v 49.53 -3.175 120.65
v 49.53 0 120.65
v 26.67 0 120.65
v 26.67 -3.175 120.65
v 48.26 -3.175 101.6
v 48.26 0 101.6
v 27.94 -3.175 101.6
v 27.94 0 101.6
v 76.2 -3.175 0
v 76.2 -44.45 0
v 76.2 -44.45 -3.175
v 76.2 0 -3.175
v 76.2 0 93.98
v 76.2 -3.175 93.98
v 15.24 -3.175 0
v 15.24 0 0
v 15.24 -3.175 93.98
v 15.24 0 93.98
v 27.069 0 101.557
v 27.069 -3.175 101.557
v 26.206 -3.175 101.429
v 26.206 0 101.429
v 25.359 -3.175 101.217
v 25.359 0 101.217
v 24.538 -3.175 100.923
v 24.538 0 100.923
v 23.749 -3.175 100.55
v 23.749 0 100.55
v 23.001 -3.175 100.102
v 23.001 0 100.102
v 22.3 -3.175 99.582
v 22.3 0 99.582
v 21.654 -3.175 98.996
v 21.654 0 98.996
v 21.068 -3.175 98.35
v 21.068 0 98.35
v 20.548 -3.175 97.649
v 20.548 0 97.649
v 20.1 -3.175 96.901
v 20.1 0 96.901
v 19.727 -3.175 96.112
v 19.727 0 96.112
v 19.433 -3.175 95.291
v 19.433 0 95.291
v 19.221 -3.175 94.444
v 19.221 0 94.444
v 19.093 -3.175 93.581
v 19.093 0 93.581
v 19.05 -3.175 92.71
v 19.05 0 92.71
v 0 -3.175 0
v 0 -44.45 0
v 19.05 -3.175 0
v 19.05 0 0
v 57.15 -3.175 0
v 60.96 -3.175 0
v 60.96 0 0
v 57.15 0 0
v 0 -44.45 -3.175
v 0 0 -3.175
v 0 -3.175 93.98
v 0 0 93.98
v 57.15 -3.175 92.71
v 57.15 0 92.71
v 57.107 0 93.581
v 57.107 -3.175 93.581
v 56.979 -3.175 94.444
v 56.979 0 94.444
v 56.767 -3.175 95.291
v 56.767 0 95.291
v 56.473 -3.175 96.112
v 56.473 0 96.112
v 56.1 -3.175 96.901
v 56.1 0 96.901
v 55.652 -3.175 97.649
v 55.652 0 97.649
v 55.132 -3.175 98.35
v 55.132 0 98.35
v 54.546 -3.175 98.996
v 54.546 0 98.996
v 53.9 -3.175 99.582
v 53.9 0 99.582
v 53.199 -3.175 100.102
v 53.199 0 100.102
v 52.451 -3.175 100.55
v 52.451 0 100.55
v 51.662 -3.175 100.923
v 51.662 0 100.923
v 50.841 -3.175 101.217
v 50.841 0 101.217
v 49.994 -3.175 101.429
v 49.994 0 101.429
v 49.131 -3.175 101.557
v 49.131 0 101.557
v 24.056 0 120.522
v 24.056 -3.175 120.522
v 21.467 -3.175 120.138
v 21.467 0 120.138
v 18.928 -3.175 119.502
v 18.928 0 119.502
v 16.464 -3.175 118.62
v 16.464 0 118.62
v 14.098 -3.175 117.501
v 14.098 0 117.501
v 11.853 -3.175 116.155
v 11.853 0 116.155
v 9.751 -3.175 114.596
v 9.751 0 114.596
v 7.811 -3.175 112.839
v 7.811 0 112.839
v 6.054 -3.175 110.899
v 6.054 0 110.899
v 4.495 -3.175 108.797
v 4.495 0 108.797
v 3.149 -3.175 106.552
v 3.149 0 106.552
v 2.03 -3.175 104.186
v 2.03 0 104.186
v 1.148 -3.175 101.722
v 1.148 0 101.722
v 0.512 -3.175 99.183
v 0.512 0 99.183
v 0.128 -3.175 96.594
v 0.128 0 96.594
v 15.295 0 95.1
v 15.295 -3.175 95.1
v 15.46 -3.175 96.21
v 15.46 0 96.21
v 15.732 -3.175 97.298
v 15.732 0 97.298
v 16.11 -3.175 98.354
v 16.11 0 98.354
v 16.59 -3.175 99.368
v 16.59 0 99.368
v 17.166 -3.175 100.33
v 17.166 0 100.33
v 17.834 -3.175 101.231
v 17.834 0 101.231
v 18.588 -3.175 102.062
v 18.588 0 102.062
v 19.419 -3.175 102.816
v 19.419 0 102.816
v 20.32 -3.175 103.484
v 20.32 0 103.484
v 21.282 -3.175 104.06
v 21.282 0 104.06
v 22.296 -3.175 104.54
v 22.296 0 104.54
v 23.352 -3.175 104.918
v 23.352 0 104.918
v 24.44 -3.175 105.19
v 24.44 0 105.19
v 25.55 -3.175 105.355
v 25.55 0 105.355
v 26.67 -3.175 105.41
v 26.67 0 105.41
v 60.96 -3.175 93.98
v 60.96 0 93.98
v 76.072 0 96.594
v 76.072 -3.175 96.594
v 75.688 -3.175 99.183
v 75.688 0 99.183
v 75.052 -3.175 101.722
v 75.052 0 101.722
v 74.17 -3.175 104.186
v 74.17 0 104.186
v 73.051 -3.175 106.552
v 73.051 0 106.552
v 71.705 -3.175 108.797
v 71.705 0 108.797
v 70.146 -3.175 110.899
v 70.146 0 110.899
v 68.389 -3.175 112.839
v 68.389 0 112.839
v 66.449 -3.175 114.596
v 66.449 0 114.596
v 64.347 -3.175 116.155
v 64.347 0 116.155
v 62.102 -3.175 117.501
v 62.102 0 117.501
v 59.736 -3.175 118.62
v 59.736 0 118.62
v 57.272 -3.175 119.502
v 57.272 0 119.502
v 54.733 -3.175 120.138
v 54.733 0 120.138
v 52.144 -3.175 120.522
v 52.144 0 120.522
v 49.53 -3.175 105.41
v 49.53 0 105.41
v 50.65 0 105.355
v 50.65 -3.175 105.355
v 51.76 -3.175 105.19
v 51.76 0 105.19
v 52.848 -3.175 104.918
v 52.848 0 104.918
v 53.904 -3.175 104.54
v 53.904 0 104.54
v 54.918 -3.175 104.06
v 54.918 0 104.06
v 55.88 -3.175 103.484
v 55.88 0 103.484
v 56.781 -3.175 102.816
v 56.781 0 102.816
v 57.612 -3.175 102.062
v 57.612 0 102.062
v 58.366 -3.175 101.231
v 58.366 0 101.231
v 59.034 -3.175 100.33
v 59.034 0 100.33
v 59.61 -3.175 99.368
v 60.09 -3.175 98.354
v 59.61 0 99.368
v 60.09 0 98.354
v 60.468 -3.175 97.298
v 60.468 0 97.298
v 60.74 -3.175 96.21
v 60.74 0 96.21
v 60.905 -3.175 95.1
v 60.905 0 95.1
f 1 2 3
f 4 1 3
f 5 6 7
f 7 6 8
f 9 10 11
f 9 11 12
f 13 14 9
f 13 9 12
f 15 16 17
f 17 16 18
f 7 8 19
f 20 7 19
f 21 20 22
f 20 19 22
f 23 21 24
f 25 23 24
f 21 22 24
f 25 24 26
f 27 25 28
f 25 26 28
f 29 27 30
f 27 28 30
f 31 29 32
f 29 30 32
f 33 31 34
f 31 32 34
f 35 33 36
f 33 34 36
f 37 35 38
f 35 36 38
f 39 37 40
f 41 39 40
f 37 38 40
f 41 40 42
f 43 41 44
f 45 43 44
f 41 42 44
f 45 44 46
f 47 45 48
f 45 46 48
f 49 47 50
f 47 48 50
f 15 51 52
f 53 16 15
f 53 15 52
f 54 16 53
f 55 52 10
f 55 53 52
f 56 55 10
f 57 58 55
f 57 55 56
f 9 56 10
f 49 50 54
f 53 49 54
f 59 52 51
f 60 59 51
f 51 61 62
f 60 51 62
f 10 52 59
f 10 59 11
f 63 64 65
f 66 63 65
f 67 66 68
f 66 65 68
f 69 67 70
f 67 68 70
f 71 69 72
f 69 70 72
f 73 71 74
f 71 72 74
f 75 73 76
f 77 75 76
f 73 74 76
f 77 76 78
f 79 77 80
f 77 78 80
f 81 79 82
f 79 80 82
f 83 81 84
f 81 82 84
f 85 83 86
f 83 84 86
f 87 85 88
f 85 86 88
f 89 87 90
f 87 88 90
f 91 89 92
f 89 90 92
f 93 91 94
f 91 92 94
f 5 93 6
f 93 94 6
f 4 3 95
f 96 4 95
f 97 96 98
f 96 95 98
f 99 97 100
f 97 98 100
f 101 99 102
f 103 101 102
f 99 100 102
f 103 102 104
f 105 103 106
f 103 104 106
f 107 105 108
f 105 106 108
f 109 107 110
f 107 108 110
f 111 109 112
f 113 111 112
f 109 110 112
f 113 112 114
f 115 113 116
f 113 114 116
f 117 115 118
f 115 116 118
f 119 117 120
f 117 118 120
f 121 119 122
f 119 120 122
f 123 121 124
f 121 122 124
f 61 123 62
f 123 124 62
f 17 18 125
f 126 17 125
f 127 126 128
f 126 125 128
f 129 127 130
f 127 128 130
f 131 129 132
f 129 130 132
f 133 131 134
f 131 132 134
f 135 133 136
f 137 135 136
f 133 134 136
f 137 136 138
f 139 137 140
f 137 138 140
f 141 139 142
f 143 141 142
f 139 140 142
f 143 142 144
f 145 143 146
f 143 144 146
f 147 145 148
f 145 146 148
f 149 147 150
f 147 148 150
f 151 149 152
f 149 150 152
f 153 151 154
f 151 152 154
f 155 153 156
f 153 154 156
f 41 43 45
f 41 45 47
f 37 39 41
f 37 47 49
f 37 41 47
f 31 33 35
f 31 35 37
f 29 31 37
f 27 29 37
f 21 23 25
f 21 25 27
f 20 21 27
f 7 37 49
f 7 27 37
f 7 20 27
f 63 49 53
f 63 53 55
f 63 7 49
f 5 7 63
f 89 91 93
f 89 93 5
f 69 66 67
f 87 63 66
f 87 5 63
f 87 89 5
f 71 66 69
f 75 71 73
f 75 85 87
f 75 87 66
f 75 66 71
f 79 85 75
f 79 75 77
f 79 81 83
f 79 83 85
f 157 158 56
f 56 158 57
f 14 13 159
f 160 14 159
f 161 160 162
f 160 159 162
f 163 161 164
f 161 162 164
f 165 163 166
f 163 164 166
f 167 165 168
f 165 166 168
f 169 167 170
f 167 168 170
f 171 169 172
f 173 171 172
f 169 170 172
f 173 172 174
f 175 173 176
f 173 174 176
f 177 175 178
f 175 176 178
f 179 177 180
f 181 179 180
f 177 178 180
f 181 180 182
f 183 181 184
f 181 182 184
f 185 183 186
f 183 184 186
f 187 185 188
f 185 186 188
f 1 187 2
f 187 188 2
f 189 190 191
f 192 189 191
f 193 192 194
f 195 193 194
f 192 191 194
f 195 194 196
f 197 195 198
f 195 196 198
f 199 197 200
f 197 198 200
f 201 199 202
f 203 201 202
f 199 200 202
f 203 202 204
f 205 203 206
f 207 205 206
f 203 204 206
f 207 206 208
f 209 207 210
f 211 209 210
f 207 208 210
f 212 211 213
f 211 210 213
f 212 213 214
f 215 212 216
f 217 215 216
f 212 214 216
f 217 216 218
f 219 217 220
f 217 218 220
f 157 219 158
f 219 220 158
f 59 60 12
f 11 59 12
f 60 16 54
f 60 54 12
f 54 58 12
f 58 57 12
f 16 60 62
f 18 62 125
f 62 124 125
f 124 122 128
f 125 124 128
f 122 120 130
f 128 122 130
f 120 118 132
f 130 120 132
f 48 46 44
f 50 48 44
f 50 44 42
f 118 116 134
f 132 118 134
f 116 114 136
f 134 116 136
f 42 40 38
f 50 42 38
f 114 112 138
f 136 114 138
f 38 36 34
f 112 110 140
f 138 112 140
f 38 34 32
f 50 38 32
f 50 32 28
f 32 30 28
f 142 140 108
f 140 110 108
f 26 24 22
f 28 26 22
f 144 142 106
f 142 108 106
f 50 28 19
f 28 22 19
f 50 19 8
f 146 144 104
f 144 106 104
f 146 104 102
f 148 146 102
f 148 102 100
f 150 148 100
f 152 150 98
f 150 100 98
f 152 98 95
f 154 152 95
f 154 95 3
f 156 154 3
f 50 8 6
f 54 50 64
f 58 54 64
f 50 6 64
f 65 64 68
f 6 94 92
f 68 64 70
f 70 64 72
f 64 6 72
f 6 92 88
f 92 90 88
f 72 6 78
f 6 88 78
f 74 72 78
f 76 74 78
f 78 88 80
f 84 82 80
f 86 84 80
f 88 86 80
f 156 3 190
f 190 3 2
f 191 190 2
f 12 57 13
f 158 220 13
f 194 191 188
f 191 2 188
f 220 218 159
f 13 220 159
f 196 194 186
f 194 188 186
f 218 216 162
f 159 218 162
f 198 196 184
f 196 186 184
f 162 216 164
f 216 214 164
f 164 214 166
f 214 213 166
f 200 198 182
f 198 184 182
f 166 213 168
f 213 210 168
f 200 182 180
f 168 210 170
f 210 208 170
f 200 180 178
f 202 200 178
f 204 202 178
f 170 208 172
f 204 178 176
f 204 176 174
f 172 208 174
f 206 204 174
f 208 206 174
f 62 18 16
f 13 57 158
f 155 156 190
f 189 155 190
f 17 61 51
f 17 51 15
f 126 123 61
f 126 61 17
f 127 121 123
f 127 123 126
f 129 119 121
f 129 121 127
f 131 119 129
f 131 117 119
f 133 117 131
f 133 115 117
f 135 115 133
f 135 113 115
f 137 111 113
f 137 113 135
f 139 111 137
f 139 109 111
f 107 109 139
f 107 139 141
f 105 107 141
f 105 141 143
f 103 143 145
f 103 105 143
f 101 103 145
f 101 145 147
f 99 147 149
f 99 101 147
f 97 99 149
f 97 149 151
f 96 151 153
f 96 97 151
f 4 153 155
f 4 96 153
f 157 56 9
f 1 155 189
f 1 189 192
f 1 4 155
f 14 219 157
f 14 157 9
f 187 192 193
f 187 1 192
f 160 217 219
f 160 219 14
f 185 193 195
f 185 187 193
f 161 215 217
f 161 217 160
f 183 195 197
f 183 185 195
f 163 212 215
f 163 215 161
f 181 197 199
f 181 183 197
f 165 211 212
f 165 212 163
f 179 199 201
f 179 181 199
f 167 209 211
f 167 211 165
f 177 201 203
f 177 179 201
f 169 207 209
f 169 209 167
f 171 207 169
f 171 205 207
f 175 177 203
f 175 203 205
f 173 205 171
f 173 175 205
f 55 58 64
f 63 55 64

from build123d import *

# Parameters (mm, degrees)
F2_DEPTH = 3.175
F3_W     = 76.2
F3_H     = 44.45
F4_DEPTH = 3.175
F6_DEPTH = 3.175


# Not quite as in the source:
# - a variable given as a bare number and used for a length is read in inches; the dataset says mm whatever the document's units were


with BuildPart() as f2:
    # F1 (on Front) → F2 (new body)
    with BuildSketch(Plane.XZ):
        with BuildLine():
            Line((49.53, 120.65), (26.67, 120.65))
            ThreePointArc((26.67, 120.65), (7.8114621458, 112.8385378542), (0, 93.98))
            Line((0, 93.98), (0, 0))
            Line((0, 0), (15.24, 0))
            Line((15.24, 0), (15.24, 93.98))
            ThreePointArc((15.24, 93.98), (18.587769491, 102.062230509), (26.67, 105.41))
            Line((26.67, 105.41), (49.53, 105.41))
            ThreePointArc((49.53, 105.41), (57.612230509, 102.062230509), (60.96, 93.98))
            Line((60.96, 93.98), (60.96, 0))
            Line((60.96, 0), (76.2, 0))
            Line((76.2, 0), (76.2, 93.98))
            ThreePointArc((76.2, 93.98), (68.3885378542, 112.8385378542), (49.53, 120.65))
        make_face()
    extrude(amount=F2_DEPTH)

    # F3 (on Top) → F4 (join)
    with BuildSketch(Plane.XY):
        with Locations((38.1, -22.225)):
            Rectangle(F3_W, F3_H)
    extrude(amount=-F4_DEPTH)

    # F5 (on Front) → F6 (join)
    with BuildSketch(Plane.XZ):
        with BuildLine():
            Line((48.26, 101.6), (27.94, 101.6))
            ThreePointArc((27.94, 101.6), (21.6538207153, 98.9961792847), (19.05, 92.71))
            Line((19.05, 92.71), (19.05, 0))
            Line((19.05, 0), (57.15, 0))
            Line((57.15, 0), (57.15, 92.71))
            ThreePointArc((57.15, 92.71), (54.5461792847, 98.9961792847), (48.26, 101.6))
        make_face()
    extrude(amount=F6_DEPTH)


solid = f2.part
